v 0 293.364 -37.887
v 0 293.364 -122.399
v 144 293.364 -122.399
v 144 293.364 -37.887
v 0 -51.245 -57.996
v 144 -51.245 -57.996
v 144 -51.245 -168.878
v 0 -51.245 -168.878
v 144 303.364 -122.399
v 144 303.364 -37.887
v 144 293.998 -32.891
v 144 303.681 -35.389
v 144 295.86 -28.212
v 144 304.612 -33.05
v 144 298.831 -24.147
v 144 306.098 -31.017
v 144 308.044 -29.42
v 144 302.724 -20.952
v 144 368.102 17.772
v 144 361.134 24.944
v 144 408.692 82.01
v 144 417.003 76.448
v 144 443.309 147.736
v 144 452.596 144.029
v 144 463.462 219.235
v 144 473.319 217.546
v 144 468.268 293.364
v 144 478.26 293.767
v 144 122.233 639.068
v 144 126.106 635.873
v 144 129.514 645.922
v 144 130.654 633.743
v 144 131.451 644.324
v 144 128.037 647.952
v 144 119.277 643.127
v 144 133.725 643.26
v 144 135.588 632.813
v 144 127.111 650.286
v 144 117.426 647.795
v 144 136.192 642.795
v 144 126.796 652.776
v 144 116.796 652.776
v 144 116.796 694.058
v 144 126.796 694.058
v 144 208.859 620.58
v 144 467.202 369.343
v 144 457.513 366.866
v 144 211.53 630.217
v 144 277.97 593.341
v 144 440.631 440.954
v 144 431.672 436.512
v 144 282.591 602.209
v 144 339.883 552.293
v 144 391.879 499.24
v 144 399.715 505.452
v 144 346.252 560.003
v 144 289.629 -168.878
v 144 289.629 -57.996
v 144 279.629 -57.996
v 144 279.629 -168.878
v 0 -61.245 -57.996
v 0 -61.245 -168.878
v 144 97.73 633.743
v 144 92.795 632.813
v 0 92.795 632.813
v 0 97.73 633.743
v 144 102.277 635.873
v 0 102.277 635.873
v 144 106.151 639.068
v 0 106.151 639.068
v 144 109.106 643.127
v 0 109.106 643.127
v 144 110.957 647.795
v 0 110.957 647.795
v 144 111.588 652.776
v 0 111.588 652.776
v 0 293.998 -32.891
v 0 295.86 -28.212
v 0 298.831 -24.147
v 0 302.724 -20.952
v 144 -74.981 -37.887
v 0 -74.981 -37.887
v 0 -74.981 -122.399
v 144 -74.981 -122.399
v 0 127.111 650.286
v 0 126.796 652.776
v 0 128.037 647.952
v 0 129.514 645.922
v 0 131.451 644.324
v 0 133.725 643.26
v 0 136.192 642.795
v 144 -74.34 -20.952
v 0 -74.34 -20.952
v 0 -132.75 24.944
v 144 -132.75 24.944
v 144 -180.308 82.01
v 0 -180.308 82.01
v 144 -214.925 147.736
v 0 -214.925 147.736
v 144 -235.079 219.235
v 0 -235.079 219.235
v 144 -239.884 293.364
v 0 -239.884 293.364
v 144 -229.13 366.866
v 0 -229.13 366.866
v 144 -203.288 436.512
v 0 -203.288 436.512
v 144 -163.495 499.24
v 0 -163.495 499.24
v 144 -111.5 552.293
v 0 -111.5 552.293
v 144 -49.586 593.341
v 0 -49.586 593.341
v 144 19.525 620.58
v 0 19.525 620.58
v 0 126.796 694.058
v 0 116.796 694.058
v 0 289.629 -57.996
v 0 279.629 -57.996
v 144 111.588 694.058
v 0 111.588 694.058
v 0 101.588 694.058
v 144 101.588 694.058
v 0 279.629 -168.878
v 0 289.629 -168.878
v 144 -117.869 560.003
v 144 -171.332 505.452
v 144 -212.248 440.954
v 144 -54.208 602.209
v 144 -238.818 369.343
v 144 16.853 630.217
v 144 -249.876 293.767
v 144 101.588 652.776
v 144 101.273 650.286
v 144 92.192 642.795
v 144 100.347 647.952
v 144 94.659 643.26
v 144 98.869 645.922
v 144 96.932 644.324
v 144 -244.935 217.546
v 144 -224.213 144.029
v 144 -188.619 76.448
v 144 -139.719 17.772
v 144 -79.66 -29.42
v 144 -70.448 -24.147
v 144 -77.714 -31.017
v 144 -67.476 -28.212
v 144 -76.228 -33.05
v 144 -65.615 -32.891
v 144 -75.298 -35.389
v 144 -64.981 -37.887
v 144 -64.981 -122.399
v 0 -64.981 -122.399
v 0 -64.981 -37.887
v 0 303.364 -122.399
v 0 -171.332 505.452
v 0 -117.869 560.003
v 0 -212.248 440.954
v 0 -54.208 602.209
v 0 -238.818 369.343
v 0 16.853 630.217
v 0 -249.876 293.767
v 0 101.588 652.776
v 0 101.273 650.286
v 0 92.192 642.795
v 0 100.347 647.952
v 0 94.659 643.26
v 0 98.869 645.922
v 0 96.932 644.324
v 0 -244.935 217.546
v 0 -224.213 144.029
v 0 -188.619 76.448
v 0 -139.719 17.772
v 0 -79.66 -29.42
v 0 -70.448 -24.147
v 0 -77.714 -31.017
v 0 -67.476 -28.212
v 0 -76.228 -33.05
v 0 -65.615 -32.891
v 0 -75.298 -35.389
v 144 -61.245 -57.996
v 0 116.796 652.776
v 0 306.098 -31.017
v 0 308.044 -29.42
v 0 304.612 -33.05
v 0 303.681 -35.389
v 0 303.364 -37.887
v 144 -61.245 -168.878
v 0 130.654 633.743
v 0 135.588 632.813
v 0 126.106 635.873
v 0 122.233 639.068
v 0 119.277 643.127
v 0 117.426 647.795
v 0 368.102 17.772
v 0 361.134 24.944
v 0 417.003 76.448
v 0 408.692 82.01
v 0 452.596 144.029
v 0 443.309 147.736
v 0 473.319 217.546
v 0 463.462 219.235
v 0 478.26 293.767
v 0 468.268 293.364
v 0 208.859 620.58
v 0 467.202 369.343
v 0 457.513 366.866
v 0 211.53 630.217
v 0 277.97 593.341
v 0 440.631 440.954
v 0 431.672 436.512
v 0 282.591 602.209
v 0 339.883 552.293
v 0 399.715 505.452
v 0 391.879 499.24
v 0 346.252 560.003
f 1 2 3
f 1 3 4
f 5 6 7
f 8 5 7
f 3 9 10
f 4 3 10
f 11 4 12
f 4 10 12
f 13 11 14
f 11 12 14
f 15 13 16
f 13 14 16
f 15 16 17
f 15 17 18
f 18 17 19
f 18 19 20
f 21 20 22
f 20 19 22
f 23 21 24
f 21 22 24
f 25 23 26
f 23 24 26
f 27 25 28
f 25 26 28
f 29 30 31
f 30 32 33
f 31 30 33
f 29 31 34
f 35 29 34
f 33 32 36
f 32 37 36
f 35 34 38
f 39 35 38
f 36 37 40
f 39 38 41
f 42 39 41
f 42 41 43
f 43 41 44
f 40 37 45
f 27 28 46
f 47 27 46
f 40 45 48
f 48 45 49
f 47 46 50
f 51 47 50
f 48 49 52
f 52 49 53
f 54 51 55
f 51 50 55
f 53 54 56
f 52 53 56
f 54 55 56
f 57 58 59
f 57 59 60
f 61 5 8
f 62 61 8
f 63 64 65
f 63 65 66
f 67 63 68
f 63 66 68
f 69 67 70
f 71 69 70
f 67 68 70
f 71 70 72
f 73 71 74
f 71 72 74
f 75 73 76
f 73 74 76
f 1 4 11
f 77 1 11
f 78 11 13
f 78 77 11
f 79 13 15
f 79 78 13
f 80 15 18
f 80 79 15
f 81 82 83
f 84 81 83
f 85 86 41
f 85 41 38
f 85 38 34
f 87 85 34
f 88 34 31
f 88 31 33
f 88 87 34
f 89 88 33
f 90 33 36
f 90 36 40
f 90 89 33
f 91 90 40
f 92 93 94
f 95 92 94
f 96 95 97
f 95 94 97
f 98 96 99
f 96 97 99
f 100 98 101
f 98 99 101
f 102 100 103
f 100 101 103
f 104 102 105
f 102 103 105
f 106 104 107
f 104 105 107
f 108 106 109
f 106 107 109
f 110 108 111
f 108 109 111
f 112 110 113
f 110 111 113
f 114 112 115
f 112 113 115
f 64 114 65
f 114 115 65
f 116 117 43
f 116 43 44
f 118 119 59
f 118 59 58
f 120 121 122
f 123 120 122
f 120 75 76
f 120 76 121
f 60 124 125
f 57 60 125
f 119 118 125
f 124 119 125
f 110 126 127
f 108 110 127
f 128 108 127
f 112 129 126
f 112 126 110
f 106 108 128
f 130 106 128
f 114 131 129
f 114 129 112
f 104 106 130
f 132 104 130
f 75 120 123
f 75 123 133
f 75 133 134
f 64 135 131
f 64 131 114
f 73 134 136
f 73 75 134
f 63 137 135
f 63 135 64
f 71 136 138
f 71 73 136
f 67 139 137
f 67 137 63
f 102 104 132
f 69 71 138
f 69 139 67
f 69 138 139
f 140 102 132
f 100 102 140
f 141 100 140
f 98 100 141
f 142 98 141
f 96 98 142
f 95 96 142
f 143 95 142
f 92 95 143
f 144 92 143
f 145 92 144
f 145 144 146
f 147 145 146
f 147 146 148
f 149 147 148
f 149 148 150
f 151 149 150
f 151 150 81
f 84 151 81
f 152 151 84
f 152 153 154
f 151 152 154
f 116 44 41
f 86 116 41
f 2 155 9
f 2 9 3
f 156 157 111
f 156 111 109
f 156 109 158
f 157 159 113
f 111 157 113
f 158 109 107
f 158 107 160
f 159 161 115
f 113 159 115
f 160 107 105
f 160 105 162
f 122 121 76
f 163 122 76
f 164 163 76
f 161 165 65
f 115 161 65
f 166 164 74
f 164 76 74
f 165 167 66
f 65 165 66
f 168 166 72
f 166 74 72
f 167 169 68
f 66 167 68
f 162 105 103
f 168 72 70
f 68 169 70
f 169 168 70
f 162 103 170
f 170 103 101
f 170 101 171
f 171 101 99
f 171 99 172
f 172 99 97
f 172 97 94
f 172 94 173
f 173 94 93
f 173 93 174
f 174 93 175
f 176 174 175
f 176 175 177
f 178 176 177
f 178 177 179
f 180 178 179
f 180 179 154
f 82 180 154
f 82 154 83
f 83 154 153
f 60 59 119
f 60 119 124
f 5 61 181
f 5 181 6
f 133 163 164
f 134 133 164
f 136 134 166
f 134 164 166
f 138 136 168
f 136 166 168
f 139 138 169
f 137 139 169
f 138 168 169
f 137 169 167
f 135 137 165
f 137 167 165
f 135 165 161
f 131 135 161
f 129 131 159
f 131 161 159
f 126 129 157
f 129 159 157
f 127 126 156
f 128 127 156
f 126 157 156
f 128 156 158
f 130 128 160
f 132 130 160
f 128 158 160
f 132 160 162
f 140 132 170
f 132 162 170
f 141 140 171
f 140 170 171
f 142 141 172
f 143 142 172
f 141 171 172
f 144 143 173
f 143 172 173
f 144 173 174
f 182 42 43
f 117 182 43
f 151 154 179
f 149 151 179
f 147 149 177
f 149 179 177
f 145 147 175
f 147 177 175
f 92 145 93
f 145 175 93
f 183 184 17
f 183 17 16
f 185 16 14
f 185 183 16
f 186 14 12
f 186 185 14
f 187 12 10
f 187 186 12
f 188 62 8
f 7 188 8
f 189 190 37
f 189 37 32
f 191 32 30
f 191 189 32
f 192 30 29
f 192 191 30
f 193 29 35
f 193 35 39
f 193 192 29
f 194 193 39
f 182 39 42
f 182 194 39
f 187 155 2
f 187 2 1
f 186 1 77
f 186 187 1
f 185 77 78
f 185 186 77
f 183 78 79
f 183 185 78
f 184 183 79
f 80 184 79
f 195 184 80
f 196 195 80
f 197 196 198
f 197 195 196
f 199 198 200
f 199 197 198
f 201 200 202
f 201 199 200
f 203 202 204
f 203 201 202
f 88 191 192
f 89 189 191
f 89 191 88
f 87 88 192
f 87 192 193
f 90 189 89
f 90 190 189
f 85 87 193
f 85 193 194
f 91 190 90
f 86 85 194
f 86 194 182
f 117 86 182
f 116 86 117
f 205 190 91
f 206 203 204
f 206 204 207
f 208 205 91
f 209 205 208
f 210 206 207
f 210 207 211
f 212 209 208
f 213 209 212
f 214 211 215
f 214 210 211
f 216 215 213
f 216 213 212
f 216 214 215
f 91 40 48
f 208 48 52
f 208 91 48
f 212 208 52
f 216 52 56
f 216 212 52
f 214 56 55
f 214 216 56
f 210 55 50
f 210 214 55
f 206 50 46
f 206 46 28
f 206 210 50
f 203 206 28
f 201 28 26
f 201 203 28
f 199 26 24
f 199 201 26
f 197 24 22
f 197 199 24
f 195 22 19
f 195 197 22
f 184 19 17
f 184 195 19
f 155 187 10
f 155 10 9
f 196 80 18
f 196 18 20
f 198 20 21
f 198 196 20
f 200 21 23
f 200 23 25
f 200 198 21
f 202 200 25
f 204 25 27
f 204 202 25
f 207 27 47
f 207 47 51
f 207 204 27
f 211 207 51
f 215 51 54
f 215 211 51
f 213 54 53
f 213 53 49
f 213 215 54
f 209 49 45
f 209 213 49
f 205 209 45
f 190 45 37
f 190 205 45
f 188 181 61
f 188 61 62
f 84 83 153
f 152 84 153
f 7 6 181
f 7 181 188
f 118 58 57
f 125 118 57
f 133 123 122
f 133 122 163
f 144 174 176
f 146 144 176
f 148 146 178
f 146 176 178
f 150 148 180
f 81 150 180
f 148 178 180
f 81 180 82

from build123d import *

# Parameters (mm, degrees)
BOSS_EXTRUDE1_DEPTH   = 144
BOSS_EXTRUDE1_2_DEPTH = 144
SKETCH1_W             = 110.88159645
SKETCH1_H             = 10
BOSS_EXTRUDE1_3_DEPTH = 144
BOSS_EXTRUDE1_4_DEPTH = 144


with BuildPart() as part:
    # Sketch1 → Boss-Extrude1 (new body)
    with BuildSketch(Plane(origin=(0, 0, 0), x_dir=(0, 0, -1), z_dir=(1, 0, 0))):
        with BuildLine():
            Line((122.399148509, -74.980712069), (122.399148509, -64.980712069))
            Line((122.399148509, -64.980712069), (37.886897495, -64.980712069))
            ThreePointArc((37.886897495, -64.980712069), (28.212497607, -67.47625587), (20.952386586, -74.340113388))
            ThreePointArc((20.952386586, -74.340113388), (-366.866488635, -229.129821907), (-632.812876508, 92.795406397))
            ThreePointArc((-632.812876508, 92.795406397), (-639.06784691, 106.150638768), (-652.776386049, 111.587810928))
            Line((-652.776386049, 111.587810928), (-694.05780786, 111.587810928))
            Line((-694.05780786, 111.587810928), (-694.05780786, 101.587810928))
            Line((-694.05780786, 101.587810928), (-652.776386049, 101.587810928))
            ThreePointArc((-652.776386049, 101.587810928), (-645.92211648, 98.869224848), (-642.794631279, 92.191608663))
            ThreePointArc((-642.794631279, 92.191608663), (-369.343336207, -238.818228696), (29.41964204, -79.660412728))
            ThreePointArc((29.41964204, -79.660412728), (33.049697551, -76.228483969), (37.886897495, -74.980712069))
            Line((37.886897495, -74.980712069), (122.399148509, -74.980712069))
        make_face()
    extrude(amount=BOSS_EXTRUDE1_DEPTH)


with BuildPart() as body_2:
    # Sketch1 → Boss-Extrude1 2 (new body)
    with BuildSketch(Plane(origin=(0, 0, 0), x_dir=(0, 0, -1), z_dir=(1, 0, 0))):
        with BuildLine():
            Line((-652.776386049, 116.795756587), (-694.05780786, 116.795756587))
            Line((-694.05780786, 116.795756587), (-694.05780786, 126.795756587))
            Line((-694.05780786, 126.795756587), (-652.776386049, 126.795756587))
            ThreePointArc((-652.776386049, 126.795756587), (-645.92211648, 129.514342667), (-642.794631279, 136.191958853))
            ThreePointArc((-642.794631279, 136.191958853), (-369.343336207, 467.201796212), (29.41964204, 308.043980244))
            ThreePointArc((29.41964204, 308.043980244), (33.049697551, 304.612051485), (37.886897495, 303.364279585))
            Line((37.886897495, 303.364279585), (122.399148509, 303.364279585))
            Line((122.399148509, 303.364279585), (122.399148509, 293.364279585))
            Line((122.399148509, 293.364279585), (37.886897495, 293.364279585))
            ThreePointArc((37.886897495, 293.364279585), (28.212497607, 295.859823386), (20.952386586, 302.723680904))
            ThreePointArc((20.952386586, 302.723680904), (-366.866488635, 457.513389423), (-632.812876508, 135.588161118))
            ThreePointArc((-632.812876508, 135.588161118), (-639.06784691, 122.232928748), (-652.776386049, 116.795756587))
        make_face()
    extrude(amount=BOSS_EXTRUDE1_2_DEPTH)


with BuildPart() as body_3:
    # Sketch1 → Boss-Extrude1 3 (new body)
    with BuildSketch(Plane(origin=(0, 0, 0), x_dir=(0, 0, -1), z_dir=(1, 0, 0))):
        with Locations((113.436775578, -56.245173975)):
            Rectangle(SKETCH1_W, SKETCH1_H)
    extrude(amount=BOSS_EXTRUDE1_3_DEPTH)


with BuildPart() as body_4:
    # Sketch1 → Boss-Extrude1 4 (new body)
    with BuildSketch(Plane(origin=(0, 0, 0), x_dir=(0, 0, -1), z_dir=(1, 0, 0))):
        with Locations((113.436775578, 284.62874149)):
            Rectangle(SKETCH1_W, SKETCH1_H)
    extrude(amount=BOSS_EXTRUDE1_4_DEPTH)


solid = Compound([part.part, body_2.part, body_3.part, body_4.part])
